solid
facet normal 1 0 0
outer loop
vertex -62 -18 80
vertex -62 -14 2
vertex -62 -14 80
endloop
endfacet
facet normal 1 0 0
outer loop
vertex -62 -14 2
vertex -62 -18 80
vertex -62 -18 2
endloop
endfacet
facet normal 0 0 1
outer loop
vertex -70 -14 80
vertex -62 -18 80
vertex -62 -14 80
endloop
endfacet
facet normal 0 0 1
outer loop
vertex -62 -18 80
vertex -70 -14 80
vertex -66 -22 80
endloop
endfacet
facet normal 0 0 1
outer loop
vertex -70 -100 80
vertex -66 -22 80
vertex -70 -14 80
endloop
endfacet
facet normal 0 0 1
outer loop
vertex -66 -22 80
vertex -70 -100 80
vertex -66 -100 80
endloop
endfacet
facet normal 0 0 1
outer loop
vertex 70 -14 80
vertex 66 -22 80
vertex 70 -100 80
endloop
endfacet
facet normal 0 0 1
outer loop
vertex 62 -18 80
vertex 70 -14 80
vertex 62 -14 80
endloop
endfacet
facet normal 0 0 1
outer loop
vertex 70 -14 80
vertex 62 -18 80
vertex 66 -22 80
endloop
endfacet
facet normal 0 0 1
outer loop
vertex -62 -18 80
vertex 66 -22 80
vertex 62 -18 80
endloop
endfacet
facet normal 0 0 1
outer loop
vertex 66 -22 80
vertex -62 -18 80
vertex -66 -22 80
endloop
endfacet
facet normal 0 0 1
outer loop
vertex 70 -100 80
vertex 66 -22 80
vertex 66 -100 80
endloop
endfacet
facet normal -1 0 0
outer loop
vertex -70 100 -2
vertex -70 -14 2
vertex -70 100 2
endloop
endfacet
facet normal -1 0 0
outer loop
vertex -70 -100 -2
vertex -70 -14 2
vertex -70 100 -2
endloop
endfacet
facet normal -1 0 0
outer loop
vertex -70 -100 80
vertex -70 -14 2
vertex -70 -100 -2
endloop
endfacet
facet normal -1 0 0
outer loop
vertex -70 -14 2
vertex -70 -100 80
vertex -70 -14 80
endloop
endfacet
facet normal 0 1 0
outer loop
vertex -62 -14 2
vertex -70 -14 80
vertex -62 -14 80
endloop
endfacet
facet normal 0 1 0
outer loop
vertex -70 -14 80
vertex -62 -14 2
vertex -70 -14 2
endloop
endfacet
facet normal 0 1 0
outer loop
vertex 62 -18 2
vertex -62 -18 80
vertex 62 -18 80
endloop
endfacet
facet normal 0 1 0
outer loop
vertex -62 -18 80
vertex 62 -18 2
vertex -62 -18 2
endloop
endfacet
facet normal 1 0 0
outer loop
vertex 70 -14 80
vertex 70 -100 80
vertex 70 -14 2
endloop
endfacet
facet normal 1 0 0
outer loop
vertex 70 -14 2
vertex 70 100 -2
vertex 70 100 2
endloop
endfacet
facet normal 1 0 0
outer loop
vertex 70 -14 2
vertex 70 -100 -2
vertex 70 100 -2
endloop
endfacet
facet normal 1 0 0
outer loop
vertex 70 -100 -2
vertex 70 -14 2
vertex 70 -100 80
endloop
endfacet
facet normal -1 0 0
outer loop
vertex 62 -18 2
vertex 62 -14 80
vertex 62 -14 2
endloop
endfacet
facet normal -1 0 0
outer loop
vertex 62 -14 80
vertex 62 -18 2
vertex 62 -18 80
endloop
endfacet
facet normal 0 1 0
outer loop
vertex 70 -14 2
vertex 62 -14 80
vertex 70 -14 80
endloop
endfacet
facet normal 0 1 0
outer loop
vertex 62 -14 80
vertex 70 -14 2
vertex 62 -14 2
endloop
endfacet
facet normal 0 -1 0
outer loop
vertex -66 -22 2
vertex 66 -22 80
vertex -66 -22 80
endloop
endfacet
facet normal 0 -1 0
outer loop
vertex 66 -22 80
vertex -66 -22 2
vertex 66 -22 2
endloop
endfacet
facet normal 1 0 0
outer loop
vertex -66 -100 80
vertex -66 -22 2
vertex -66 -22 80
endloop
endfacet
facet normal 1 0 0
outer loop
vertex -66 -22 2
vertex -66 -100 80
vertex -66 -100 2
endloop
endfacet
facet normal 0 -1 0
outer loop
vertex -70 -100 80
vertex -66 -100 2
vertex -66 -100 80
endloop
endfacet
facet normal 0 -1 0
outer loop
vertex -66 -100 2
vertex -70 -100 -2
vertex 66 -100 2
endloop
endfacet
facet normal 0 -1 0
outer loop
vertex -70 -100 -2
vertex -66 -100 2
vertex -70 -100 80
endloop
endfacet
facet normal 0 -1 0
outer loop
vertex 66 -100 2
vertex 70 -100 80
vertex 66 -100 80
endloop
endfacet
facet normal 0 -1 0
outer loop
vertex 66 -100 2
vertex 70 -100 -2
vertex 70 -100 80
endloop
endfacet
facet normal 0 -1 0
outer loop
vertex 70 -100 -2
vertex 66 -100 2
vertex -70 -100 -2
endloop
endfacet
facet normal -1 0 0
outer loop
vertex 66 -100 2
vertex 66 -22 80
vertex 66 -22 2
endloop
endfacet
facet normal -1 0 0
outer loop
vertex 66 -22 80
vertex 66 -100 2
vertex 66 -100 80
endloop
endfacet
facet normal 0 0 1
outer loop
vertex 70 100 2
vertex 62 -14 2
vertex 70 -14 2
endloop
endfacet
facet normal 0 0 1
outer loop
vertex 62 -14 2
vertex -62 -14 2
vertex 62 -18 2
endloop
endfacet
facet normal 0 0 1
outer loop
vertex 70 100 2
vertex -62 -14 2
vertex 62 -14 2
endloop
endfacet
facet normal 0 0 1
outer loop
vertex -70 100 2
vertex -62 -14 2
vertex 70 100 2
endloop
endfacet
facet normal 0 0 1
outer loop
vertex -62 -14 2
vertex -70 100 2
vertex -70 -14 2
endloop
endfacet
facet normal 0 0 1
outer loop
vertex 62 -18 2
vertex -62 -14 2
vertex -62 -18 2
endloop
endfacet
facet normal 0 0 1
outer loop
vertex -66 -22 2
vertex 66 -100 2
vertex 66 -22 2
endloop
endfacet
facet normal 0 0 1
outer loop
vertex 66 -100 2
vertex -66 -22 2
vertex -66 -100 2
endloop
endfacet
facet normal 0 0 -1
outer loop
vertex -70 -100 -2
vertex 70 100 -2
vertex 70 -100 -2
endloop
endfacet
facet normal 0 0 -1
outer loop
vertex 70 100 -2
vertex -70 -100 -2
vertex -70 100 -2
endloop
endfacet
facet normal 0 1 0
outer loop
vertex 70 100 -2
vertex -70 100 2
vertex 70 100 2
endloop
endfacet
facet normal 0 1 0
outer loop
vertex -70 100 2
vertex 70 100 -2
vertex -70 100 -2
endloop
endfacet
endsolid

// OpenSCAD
width = 140;
length = 80;
height = 200;
height_mid = 80;
floor_length = 80;
thickness = 4;
rail_width = 8;
rail_height = 4;

t_maze(
    width = width,
    length = length,
    height = height,
    height_mid = height_mid,
    floor_length = floor_length,
    thickness = thickness);

module t_maze(
    width,
    length,
    height,
    height_mid,
    floor_length,
    thickness
    ){
        // Back piece
        difference(){
            cube([width, height, thickness], center = true);

            // Slits for transparent perspex
        }

        // Floor
        translate([0,-(height/2)+height_mid,floor_length/2])
        union(){
            cube([width, thickness, floor_length], center = true);

            // Rails
            for (i = [-1,1]){
                translate([i*(width-rail_width)/2,thickness,0])
                difference(){
                    cube([rail_width, rail_height, floor_length], center=true);
                    // Holes for 
            }
            }
        }

        // Walls for standing stability
        for (i = [-1,1]){
            translate([i*(width-thickness)/2,-(height/2)+height_mid/2,floor_length/2])
            cube([thickness, height_mid, floor_length], center=true);
        }

        
}
